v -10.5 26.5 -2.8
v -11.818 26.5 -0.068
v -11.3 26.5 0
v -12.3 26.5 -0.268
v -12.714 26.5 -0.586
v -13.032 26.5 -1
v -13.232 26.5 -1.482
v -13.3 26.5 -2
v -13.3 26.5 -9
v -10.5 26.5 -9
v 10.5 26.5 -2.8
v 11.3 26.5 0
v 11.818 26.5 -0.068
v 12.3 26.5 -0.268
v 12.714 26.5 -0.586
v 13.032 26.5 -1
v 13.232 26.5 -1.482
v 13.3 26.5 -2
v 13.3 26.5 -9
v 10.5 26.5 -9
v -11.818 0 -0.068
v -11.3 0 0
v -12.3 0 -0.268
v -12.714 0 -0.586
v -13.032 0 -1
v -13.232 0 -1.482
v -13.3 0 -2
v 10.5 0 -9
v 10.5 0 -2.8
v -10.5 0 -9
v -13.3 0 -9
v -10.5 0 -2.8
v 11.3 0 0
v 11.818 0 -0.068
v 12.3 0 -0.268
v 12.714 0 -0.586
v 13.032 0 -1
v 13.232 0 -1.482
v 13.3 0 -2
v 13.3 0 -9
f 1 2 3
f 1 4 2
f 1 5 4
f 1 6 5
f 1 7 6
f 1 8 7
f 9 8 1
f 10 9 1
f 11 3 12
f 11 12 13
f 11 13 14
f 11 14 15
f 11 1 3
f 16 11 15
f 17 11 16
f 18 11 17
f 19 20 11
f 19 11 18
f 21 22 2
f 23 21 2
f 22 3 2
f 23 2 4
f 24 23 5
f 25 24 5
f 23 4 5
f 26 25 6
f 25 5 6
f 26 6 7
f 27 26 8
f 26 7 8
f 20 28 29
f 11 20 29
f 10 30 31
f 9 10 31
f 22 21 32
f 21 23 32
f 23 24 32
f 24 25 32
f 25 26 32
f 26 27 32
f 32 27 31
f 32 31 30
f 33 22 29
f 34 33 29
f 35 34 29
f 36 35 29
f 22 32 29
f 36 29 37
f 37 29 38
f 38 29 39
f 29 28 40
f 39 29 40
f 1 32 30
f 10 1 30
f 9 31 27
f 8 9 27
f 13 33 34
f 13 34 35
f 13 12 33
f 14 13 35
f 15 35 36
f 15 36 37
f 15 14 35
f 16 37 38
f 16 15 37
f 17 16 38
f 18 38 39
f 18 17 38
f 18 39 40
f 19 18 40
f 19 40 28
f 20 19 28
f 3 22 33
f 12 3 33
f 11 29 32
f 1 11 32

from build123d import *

# Parameters (mm, degrees)
BOSS_EXTRU_1_DEPTH = 26.5
CONG_1_R           = 2


with BuildPart() as part:
    # Esquisse1 → Boss.-Extru.1 (new body)
    with BuildSketch(Plane(origin=(0, 0, 0), x_dir=(1, 0, 0), z_dir=(0, 1, 0))):
        Polygon((-13.3, 0), (13.3, 0), (13.3, 9), (10.5, 9), (10.5, 2.8), (-10.5, 2.8), (-10.5, 9), (-13.3, 9), align=None)
    extrude(amount=BOSS_EXTRU_1_DEPTH)

    # Congé1
    cong_1_edges = [part.edges().sort_by_distance(p)[0] for p in [
        (13.3, 13.25, 0),
        (-13.3, 13.25, 0),
    ]]
    fillet(cong_1_edges, radius=CONG_1_R)


solid = part.part
